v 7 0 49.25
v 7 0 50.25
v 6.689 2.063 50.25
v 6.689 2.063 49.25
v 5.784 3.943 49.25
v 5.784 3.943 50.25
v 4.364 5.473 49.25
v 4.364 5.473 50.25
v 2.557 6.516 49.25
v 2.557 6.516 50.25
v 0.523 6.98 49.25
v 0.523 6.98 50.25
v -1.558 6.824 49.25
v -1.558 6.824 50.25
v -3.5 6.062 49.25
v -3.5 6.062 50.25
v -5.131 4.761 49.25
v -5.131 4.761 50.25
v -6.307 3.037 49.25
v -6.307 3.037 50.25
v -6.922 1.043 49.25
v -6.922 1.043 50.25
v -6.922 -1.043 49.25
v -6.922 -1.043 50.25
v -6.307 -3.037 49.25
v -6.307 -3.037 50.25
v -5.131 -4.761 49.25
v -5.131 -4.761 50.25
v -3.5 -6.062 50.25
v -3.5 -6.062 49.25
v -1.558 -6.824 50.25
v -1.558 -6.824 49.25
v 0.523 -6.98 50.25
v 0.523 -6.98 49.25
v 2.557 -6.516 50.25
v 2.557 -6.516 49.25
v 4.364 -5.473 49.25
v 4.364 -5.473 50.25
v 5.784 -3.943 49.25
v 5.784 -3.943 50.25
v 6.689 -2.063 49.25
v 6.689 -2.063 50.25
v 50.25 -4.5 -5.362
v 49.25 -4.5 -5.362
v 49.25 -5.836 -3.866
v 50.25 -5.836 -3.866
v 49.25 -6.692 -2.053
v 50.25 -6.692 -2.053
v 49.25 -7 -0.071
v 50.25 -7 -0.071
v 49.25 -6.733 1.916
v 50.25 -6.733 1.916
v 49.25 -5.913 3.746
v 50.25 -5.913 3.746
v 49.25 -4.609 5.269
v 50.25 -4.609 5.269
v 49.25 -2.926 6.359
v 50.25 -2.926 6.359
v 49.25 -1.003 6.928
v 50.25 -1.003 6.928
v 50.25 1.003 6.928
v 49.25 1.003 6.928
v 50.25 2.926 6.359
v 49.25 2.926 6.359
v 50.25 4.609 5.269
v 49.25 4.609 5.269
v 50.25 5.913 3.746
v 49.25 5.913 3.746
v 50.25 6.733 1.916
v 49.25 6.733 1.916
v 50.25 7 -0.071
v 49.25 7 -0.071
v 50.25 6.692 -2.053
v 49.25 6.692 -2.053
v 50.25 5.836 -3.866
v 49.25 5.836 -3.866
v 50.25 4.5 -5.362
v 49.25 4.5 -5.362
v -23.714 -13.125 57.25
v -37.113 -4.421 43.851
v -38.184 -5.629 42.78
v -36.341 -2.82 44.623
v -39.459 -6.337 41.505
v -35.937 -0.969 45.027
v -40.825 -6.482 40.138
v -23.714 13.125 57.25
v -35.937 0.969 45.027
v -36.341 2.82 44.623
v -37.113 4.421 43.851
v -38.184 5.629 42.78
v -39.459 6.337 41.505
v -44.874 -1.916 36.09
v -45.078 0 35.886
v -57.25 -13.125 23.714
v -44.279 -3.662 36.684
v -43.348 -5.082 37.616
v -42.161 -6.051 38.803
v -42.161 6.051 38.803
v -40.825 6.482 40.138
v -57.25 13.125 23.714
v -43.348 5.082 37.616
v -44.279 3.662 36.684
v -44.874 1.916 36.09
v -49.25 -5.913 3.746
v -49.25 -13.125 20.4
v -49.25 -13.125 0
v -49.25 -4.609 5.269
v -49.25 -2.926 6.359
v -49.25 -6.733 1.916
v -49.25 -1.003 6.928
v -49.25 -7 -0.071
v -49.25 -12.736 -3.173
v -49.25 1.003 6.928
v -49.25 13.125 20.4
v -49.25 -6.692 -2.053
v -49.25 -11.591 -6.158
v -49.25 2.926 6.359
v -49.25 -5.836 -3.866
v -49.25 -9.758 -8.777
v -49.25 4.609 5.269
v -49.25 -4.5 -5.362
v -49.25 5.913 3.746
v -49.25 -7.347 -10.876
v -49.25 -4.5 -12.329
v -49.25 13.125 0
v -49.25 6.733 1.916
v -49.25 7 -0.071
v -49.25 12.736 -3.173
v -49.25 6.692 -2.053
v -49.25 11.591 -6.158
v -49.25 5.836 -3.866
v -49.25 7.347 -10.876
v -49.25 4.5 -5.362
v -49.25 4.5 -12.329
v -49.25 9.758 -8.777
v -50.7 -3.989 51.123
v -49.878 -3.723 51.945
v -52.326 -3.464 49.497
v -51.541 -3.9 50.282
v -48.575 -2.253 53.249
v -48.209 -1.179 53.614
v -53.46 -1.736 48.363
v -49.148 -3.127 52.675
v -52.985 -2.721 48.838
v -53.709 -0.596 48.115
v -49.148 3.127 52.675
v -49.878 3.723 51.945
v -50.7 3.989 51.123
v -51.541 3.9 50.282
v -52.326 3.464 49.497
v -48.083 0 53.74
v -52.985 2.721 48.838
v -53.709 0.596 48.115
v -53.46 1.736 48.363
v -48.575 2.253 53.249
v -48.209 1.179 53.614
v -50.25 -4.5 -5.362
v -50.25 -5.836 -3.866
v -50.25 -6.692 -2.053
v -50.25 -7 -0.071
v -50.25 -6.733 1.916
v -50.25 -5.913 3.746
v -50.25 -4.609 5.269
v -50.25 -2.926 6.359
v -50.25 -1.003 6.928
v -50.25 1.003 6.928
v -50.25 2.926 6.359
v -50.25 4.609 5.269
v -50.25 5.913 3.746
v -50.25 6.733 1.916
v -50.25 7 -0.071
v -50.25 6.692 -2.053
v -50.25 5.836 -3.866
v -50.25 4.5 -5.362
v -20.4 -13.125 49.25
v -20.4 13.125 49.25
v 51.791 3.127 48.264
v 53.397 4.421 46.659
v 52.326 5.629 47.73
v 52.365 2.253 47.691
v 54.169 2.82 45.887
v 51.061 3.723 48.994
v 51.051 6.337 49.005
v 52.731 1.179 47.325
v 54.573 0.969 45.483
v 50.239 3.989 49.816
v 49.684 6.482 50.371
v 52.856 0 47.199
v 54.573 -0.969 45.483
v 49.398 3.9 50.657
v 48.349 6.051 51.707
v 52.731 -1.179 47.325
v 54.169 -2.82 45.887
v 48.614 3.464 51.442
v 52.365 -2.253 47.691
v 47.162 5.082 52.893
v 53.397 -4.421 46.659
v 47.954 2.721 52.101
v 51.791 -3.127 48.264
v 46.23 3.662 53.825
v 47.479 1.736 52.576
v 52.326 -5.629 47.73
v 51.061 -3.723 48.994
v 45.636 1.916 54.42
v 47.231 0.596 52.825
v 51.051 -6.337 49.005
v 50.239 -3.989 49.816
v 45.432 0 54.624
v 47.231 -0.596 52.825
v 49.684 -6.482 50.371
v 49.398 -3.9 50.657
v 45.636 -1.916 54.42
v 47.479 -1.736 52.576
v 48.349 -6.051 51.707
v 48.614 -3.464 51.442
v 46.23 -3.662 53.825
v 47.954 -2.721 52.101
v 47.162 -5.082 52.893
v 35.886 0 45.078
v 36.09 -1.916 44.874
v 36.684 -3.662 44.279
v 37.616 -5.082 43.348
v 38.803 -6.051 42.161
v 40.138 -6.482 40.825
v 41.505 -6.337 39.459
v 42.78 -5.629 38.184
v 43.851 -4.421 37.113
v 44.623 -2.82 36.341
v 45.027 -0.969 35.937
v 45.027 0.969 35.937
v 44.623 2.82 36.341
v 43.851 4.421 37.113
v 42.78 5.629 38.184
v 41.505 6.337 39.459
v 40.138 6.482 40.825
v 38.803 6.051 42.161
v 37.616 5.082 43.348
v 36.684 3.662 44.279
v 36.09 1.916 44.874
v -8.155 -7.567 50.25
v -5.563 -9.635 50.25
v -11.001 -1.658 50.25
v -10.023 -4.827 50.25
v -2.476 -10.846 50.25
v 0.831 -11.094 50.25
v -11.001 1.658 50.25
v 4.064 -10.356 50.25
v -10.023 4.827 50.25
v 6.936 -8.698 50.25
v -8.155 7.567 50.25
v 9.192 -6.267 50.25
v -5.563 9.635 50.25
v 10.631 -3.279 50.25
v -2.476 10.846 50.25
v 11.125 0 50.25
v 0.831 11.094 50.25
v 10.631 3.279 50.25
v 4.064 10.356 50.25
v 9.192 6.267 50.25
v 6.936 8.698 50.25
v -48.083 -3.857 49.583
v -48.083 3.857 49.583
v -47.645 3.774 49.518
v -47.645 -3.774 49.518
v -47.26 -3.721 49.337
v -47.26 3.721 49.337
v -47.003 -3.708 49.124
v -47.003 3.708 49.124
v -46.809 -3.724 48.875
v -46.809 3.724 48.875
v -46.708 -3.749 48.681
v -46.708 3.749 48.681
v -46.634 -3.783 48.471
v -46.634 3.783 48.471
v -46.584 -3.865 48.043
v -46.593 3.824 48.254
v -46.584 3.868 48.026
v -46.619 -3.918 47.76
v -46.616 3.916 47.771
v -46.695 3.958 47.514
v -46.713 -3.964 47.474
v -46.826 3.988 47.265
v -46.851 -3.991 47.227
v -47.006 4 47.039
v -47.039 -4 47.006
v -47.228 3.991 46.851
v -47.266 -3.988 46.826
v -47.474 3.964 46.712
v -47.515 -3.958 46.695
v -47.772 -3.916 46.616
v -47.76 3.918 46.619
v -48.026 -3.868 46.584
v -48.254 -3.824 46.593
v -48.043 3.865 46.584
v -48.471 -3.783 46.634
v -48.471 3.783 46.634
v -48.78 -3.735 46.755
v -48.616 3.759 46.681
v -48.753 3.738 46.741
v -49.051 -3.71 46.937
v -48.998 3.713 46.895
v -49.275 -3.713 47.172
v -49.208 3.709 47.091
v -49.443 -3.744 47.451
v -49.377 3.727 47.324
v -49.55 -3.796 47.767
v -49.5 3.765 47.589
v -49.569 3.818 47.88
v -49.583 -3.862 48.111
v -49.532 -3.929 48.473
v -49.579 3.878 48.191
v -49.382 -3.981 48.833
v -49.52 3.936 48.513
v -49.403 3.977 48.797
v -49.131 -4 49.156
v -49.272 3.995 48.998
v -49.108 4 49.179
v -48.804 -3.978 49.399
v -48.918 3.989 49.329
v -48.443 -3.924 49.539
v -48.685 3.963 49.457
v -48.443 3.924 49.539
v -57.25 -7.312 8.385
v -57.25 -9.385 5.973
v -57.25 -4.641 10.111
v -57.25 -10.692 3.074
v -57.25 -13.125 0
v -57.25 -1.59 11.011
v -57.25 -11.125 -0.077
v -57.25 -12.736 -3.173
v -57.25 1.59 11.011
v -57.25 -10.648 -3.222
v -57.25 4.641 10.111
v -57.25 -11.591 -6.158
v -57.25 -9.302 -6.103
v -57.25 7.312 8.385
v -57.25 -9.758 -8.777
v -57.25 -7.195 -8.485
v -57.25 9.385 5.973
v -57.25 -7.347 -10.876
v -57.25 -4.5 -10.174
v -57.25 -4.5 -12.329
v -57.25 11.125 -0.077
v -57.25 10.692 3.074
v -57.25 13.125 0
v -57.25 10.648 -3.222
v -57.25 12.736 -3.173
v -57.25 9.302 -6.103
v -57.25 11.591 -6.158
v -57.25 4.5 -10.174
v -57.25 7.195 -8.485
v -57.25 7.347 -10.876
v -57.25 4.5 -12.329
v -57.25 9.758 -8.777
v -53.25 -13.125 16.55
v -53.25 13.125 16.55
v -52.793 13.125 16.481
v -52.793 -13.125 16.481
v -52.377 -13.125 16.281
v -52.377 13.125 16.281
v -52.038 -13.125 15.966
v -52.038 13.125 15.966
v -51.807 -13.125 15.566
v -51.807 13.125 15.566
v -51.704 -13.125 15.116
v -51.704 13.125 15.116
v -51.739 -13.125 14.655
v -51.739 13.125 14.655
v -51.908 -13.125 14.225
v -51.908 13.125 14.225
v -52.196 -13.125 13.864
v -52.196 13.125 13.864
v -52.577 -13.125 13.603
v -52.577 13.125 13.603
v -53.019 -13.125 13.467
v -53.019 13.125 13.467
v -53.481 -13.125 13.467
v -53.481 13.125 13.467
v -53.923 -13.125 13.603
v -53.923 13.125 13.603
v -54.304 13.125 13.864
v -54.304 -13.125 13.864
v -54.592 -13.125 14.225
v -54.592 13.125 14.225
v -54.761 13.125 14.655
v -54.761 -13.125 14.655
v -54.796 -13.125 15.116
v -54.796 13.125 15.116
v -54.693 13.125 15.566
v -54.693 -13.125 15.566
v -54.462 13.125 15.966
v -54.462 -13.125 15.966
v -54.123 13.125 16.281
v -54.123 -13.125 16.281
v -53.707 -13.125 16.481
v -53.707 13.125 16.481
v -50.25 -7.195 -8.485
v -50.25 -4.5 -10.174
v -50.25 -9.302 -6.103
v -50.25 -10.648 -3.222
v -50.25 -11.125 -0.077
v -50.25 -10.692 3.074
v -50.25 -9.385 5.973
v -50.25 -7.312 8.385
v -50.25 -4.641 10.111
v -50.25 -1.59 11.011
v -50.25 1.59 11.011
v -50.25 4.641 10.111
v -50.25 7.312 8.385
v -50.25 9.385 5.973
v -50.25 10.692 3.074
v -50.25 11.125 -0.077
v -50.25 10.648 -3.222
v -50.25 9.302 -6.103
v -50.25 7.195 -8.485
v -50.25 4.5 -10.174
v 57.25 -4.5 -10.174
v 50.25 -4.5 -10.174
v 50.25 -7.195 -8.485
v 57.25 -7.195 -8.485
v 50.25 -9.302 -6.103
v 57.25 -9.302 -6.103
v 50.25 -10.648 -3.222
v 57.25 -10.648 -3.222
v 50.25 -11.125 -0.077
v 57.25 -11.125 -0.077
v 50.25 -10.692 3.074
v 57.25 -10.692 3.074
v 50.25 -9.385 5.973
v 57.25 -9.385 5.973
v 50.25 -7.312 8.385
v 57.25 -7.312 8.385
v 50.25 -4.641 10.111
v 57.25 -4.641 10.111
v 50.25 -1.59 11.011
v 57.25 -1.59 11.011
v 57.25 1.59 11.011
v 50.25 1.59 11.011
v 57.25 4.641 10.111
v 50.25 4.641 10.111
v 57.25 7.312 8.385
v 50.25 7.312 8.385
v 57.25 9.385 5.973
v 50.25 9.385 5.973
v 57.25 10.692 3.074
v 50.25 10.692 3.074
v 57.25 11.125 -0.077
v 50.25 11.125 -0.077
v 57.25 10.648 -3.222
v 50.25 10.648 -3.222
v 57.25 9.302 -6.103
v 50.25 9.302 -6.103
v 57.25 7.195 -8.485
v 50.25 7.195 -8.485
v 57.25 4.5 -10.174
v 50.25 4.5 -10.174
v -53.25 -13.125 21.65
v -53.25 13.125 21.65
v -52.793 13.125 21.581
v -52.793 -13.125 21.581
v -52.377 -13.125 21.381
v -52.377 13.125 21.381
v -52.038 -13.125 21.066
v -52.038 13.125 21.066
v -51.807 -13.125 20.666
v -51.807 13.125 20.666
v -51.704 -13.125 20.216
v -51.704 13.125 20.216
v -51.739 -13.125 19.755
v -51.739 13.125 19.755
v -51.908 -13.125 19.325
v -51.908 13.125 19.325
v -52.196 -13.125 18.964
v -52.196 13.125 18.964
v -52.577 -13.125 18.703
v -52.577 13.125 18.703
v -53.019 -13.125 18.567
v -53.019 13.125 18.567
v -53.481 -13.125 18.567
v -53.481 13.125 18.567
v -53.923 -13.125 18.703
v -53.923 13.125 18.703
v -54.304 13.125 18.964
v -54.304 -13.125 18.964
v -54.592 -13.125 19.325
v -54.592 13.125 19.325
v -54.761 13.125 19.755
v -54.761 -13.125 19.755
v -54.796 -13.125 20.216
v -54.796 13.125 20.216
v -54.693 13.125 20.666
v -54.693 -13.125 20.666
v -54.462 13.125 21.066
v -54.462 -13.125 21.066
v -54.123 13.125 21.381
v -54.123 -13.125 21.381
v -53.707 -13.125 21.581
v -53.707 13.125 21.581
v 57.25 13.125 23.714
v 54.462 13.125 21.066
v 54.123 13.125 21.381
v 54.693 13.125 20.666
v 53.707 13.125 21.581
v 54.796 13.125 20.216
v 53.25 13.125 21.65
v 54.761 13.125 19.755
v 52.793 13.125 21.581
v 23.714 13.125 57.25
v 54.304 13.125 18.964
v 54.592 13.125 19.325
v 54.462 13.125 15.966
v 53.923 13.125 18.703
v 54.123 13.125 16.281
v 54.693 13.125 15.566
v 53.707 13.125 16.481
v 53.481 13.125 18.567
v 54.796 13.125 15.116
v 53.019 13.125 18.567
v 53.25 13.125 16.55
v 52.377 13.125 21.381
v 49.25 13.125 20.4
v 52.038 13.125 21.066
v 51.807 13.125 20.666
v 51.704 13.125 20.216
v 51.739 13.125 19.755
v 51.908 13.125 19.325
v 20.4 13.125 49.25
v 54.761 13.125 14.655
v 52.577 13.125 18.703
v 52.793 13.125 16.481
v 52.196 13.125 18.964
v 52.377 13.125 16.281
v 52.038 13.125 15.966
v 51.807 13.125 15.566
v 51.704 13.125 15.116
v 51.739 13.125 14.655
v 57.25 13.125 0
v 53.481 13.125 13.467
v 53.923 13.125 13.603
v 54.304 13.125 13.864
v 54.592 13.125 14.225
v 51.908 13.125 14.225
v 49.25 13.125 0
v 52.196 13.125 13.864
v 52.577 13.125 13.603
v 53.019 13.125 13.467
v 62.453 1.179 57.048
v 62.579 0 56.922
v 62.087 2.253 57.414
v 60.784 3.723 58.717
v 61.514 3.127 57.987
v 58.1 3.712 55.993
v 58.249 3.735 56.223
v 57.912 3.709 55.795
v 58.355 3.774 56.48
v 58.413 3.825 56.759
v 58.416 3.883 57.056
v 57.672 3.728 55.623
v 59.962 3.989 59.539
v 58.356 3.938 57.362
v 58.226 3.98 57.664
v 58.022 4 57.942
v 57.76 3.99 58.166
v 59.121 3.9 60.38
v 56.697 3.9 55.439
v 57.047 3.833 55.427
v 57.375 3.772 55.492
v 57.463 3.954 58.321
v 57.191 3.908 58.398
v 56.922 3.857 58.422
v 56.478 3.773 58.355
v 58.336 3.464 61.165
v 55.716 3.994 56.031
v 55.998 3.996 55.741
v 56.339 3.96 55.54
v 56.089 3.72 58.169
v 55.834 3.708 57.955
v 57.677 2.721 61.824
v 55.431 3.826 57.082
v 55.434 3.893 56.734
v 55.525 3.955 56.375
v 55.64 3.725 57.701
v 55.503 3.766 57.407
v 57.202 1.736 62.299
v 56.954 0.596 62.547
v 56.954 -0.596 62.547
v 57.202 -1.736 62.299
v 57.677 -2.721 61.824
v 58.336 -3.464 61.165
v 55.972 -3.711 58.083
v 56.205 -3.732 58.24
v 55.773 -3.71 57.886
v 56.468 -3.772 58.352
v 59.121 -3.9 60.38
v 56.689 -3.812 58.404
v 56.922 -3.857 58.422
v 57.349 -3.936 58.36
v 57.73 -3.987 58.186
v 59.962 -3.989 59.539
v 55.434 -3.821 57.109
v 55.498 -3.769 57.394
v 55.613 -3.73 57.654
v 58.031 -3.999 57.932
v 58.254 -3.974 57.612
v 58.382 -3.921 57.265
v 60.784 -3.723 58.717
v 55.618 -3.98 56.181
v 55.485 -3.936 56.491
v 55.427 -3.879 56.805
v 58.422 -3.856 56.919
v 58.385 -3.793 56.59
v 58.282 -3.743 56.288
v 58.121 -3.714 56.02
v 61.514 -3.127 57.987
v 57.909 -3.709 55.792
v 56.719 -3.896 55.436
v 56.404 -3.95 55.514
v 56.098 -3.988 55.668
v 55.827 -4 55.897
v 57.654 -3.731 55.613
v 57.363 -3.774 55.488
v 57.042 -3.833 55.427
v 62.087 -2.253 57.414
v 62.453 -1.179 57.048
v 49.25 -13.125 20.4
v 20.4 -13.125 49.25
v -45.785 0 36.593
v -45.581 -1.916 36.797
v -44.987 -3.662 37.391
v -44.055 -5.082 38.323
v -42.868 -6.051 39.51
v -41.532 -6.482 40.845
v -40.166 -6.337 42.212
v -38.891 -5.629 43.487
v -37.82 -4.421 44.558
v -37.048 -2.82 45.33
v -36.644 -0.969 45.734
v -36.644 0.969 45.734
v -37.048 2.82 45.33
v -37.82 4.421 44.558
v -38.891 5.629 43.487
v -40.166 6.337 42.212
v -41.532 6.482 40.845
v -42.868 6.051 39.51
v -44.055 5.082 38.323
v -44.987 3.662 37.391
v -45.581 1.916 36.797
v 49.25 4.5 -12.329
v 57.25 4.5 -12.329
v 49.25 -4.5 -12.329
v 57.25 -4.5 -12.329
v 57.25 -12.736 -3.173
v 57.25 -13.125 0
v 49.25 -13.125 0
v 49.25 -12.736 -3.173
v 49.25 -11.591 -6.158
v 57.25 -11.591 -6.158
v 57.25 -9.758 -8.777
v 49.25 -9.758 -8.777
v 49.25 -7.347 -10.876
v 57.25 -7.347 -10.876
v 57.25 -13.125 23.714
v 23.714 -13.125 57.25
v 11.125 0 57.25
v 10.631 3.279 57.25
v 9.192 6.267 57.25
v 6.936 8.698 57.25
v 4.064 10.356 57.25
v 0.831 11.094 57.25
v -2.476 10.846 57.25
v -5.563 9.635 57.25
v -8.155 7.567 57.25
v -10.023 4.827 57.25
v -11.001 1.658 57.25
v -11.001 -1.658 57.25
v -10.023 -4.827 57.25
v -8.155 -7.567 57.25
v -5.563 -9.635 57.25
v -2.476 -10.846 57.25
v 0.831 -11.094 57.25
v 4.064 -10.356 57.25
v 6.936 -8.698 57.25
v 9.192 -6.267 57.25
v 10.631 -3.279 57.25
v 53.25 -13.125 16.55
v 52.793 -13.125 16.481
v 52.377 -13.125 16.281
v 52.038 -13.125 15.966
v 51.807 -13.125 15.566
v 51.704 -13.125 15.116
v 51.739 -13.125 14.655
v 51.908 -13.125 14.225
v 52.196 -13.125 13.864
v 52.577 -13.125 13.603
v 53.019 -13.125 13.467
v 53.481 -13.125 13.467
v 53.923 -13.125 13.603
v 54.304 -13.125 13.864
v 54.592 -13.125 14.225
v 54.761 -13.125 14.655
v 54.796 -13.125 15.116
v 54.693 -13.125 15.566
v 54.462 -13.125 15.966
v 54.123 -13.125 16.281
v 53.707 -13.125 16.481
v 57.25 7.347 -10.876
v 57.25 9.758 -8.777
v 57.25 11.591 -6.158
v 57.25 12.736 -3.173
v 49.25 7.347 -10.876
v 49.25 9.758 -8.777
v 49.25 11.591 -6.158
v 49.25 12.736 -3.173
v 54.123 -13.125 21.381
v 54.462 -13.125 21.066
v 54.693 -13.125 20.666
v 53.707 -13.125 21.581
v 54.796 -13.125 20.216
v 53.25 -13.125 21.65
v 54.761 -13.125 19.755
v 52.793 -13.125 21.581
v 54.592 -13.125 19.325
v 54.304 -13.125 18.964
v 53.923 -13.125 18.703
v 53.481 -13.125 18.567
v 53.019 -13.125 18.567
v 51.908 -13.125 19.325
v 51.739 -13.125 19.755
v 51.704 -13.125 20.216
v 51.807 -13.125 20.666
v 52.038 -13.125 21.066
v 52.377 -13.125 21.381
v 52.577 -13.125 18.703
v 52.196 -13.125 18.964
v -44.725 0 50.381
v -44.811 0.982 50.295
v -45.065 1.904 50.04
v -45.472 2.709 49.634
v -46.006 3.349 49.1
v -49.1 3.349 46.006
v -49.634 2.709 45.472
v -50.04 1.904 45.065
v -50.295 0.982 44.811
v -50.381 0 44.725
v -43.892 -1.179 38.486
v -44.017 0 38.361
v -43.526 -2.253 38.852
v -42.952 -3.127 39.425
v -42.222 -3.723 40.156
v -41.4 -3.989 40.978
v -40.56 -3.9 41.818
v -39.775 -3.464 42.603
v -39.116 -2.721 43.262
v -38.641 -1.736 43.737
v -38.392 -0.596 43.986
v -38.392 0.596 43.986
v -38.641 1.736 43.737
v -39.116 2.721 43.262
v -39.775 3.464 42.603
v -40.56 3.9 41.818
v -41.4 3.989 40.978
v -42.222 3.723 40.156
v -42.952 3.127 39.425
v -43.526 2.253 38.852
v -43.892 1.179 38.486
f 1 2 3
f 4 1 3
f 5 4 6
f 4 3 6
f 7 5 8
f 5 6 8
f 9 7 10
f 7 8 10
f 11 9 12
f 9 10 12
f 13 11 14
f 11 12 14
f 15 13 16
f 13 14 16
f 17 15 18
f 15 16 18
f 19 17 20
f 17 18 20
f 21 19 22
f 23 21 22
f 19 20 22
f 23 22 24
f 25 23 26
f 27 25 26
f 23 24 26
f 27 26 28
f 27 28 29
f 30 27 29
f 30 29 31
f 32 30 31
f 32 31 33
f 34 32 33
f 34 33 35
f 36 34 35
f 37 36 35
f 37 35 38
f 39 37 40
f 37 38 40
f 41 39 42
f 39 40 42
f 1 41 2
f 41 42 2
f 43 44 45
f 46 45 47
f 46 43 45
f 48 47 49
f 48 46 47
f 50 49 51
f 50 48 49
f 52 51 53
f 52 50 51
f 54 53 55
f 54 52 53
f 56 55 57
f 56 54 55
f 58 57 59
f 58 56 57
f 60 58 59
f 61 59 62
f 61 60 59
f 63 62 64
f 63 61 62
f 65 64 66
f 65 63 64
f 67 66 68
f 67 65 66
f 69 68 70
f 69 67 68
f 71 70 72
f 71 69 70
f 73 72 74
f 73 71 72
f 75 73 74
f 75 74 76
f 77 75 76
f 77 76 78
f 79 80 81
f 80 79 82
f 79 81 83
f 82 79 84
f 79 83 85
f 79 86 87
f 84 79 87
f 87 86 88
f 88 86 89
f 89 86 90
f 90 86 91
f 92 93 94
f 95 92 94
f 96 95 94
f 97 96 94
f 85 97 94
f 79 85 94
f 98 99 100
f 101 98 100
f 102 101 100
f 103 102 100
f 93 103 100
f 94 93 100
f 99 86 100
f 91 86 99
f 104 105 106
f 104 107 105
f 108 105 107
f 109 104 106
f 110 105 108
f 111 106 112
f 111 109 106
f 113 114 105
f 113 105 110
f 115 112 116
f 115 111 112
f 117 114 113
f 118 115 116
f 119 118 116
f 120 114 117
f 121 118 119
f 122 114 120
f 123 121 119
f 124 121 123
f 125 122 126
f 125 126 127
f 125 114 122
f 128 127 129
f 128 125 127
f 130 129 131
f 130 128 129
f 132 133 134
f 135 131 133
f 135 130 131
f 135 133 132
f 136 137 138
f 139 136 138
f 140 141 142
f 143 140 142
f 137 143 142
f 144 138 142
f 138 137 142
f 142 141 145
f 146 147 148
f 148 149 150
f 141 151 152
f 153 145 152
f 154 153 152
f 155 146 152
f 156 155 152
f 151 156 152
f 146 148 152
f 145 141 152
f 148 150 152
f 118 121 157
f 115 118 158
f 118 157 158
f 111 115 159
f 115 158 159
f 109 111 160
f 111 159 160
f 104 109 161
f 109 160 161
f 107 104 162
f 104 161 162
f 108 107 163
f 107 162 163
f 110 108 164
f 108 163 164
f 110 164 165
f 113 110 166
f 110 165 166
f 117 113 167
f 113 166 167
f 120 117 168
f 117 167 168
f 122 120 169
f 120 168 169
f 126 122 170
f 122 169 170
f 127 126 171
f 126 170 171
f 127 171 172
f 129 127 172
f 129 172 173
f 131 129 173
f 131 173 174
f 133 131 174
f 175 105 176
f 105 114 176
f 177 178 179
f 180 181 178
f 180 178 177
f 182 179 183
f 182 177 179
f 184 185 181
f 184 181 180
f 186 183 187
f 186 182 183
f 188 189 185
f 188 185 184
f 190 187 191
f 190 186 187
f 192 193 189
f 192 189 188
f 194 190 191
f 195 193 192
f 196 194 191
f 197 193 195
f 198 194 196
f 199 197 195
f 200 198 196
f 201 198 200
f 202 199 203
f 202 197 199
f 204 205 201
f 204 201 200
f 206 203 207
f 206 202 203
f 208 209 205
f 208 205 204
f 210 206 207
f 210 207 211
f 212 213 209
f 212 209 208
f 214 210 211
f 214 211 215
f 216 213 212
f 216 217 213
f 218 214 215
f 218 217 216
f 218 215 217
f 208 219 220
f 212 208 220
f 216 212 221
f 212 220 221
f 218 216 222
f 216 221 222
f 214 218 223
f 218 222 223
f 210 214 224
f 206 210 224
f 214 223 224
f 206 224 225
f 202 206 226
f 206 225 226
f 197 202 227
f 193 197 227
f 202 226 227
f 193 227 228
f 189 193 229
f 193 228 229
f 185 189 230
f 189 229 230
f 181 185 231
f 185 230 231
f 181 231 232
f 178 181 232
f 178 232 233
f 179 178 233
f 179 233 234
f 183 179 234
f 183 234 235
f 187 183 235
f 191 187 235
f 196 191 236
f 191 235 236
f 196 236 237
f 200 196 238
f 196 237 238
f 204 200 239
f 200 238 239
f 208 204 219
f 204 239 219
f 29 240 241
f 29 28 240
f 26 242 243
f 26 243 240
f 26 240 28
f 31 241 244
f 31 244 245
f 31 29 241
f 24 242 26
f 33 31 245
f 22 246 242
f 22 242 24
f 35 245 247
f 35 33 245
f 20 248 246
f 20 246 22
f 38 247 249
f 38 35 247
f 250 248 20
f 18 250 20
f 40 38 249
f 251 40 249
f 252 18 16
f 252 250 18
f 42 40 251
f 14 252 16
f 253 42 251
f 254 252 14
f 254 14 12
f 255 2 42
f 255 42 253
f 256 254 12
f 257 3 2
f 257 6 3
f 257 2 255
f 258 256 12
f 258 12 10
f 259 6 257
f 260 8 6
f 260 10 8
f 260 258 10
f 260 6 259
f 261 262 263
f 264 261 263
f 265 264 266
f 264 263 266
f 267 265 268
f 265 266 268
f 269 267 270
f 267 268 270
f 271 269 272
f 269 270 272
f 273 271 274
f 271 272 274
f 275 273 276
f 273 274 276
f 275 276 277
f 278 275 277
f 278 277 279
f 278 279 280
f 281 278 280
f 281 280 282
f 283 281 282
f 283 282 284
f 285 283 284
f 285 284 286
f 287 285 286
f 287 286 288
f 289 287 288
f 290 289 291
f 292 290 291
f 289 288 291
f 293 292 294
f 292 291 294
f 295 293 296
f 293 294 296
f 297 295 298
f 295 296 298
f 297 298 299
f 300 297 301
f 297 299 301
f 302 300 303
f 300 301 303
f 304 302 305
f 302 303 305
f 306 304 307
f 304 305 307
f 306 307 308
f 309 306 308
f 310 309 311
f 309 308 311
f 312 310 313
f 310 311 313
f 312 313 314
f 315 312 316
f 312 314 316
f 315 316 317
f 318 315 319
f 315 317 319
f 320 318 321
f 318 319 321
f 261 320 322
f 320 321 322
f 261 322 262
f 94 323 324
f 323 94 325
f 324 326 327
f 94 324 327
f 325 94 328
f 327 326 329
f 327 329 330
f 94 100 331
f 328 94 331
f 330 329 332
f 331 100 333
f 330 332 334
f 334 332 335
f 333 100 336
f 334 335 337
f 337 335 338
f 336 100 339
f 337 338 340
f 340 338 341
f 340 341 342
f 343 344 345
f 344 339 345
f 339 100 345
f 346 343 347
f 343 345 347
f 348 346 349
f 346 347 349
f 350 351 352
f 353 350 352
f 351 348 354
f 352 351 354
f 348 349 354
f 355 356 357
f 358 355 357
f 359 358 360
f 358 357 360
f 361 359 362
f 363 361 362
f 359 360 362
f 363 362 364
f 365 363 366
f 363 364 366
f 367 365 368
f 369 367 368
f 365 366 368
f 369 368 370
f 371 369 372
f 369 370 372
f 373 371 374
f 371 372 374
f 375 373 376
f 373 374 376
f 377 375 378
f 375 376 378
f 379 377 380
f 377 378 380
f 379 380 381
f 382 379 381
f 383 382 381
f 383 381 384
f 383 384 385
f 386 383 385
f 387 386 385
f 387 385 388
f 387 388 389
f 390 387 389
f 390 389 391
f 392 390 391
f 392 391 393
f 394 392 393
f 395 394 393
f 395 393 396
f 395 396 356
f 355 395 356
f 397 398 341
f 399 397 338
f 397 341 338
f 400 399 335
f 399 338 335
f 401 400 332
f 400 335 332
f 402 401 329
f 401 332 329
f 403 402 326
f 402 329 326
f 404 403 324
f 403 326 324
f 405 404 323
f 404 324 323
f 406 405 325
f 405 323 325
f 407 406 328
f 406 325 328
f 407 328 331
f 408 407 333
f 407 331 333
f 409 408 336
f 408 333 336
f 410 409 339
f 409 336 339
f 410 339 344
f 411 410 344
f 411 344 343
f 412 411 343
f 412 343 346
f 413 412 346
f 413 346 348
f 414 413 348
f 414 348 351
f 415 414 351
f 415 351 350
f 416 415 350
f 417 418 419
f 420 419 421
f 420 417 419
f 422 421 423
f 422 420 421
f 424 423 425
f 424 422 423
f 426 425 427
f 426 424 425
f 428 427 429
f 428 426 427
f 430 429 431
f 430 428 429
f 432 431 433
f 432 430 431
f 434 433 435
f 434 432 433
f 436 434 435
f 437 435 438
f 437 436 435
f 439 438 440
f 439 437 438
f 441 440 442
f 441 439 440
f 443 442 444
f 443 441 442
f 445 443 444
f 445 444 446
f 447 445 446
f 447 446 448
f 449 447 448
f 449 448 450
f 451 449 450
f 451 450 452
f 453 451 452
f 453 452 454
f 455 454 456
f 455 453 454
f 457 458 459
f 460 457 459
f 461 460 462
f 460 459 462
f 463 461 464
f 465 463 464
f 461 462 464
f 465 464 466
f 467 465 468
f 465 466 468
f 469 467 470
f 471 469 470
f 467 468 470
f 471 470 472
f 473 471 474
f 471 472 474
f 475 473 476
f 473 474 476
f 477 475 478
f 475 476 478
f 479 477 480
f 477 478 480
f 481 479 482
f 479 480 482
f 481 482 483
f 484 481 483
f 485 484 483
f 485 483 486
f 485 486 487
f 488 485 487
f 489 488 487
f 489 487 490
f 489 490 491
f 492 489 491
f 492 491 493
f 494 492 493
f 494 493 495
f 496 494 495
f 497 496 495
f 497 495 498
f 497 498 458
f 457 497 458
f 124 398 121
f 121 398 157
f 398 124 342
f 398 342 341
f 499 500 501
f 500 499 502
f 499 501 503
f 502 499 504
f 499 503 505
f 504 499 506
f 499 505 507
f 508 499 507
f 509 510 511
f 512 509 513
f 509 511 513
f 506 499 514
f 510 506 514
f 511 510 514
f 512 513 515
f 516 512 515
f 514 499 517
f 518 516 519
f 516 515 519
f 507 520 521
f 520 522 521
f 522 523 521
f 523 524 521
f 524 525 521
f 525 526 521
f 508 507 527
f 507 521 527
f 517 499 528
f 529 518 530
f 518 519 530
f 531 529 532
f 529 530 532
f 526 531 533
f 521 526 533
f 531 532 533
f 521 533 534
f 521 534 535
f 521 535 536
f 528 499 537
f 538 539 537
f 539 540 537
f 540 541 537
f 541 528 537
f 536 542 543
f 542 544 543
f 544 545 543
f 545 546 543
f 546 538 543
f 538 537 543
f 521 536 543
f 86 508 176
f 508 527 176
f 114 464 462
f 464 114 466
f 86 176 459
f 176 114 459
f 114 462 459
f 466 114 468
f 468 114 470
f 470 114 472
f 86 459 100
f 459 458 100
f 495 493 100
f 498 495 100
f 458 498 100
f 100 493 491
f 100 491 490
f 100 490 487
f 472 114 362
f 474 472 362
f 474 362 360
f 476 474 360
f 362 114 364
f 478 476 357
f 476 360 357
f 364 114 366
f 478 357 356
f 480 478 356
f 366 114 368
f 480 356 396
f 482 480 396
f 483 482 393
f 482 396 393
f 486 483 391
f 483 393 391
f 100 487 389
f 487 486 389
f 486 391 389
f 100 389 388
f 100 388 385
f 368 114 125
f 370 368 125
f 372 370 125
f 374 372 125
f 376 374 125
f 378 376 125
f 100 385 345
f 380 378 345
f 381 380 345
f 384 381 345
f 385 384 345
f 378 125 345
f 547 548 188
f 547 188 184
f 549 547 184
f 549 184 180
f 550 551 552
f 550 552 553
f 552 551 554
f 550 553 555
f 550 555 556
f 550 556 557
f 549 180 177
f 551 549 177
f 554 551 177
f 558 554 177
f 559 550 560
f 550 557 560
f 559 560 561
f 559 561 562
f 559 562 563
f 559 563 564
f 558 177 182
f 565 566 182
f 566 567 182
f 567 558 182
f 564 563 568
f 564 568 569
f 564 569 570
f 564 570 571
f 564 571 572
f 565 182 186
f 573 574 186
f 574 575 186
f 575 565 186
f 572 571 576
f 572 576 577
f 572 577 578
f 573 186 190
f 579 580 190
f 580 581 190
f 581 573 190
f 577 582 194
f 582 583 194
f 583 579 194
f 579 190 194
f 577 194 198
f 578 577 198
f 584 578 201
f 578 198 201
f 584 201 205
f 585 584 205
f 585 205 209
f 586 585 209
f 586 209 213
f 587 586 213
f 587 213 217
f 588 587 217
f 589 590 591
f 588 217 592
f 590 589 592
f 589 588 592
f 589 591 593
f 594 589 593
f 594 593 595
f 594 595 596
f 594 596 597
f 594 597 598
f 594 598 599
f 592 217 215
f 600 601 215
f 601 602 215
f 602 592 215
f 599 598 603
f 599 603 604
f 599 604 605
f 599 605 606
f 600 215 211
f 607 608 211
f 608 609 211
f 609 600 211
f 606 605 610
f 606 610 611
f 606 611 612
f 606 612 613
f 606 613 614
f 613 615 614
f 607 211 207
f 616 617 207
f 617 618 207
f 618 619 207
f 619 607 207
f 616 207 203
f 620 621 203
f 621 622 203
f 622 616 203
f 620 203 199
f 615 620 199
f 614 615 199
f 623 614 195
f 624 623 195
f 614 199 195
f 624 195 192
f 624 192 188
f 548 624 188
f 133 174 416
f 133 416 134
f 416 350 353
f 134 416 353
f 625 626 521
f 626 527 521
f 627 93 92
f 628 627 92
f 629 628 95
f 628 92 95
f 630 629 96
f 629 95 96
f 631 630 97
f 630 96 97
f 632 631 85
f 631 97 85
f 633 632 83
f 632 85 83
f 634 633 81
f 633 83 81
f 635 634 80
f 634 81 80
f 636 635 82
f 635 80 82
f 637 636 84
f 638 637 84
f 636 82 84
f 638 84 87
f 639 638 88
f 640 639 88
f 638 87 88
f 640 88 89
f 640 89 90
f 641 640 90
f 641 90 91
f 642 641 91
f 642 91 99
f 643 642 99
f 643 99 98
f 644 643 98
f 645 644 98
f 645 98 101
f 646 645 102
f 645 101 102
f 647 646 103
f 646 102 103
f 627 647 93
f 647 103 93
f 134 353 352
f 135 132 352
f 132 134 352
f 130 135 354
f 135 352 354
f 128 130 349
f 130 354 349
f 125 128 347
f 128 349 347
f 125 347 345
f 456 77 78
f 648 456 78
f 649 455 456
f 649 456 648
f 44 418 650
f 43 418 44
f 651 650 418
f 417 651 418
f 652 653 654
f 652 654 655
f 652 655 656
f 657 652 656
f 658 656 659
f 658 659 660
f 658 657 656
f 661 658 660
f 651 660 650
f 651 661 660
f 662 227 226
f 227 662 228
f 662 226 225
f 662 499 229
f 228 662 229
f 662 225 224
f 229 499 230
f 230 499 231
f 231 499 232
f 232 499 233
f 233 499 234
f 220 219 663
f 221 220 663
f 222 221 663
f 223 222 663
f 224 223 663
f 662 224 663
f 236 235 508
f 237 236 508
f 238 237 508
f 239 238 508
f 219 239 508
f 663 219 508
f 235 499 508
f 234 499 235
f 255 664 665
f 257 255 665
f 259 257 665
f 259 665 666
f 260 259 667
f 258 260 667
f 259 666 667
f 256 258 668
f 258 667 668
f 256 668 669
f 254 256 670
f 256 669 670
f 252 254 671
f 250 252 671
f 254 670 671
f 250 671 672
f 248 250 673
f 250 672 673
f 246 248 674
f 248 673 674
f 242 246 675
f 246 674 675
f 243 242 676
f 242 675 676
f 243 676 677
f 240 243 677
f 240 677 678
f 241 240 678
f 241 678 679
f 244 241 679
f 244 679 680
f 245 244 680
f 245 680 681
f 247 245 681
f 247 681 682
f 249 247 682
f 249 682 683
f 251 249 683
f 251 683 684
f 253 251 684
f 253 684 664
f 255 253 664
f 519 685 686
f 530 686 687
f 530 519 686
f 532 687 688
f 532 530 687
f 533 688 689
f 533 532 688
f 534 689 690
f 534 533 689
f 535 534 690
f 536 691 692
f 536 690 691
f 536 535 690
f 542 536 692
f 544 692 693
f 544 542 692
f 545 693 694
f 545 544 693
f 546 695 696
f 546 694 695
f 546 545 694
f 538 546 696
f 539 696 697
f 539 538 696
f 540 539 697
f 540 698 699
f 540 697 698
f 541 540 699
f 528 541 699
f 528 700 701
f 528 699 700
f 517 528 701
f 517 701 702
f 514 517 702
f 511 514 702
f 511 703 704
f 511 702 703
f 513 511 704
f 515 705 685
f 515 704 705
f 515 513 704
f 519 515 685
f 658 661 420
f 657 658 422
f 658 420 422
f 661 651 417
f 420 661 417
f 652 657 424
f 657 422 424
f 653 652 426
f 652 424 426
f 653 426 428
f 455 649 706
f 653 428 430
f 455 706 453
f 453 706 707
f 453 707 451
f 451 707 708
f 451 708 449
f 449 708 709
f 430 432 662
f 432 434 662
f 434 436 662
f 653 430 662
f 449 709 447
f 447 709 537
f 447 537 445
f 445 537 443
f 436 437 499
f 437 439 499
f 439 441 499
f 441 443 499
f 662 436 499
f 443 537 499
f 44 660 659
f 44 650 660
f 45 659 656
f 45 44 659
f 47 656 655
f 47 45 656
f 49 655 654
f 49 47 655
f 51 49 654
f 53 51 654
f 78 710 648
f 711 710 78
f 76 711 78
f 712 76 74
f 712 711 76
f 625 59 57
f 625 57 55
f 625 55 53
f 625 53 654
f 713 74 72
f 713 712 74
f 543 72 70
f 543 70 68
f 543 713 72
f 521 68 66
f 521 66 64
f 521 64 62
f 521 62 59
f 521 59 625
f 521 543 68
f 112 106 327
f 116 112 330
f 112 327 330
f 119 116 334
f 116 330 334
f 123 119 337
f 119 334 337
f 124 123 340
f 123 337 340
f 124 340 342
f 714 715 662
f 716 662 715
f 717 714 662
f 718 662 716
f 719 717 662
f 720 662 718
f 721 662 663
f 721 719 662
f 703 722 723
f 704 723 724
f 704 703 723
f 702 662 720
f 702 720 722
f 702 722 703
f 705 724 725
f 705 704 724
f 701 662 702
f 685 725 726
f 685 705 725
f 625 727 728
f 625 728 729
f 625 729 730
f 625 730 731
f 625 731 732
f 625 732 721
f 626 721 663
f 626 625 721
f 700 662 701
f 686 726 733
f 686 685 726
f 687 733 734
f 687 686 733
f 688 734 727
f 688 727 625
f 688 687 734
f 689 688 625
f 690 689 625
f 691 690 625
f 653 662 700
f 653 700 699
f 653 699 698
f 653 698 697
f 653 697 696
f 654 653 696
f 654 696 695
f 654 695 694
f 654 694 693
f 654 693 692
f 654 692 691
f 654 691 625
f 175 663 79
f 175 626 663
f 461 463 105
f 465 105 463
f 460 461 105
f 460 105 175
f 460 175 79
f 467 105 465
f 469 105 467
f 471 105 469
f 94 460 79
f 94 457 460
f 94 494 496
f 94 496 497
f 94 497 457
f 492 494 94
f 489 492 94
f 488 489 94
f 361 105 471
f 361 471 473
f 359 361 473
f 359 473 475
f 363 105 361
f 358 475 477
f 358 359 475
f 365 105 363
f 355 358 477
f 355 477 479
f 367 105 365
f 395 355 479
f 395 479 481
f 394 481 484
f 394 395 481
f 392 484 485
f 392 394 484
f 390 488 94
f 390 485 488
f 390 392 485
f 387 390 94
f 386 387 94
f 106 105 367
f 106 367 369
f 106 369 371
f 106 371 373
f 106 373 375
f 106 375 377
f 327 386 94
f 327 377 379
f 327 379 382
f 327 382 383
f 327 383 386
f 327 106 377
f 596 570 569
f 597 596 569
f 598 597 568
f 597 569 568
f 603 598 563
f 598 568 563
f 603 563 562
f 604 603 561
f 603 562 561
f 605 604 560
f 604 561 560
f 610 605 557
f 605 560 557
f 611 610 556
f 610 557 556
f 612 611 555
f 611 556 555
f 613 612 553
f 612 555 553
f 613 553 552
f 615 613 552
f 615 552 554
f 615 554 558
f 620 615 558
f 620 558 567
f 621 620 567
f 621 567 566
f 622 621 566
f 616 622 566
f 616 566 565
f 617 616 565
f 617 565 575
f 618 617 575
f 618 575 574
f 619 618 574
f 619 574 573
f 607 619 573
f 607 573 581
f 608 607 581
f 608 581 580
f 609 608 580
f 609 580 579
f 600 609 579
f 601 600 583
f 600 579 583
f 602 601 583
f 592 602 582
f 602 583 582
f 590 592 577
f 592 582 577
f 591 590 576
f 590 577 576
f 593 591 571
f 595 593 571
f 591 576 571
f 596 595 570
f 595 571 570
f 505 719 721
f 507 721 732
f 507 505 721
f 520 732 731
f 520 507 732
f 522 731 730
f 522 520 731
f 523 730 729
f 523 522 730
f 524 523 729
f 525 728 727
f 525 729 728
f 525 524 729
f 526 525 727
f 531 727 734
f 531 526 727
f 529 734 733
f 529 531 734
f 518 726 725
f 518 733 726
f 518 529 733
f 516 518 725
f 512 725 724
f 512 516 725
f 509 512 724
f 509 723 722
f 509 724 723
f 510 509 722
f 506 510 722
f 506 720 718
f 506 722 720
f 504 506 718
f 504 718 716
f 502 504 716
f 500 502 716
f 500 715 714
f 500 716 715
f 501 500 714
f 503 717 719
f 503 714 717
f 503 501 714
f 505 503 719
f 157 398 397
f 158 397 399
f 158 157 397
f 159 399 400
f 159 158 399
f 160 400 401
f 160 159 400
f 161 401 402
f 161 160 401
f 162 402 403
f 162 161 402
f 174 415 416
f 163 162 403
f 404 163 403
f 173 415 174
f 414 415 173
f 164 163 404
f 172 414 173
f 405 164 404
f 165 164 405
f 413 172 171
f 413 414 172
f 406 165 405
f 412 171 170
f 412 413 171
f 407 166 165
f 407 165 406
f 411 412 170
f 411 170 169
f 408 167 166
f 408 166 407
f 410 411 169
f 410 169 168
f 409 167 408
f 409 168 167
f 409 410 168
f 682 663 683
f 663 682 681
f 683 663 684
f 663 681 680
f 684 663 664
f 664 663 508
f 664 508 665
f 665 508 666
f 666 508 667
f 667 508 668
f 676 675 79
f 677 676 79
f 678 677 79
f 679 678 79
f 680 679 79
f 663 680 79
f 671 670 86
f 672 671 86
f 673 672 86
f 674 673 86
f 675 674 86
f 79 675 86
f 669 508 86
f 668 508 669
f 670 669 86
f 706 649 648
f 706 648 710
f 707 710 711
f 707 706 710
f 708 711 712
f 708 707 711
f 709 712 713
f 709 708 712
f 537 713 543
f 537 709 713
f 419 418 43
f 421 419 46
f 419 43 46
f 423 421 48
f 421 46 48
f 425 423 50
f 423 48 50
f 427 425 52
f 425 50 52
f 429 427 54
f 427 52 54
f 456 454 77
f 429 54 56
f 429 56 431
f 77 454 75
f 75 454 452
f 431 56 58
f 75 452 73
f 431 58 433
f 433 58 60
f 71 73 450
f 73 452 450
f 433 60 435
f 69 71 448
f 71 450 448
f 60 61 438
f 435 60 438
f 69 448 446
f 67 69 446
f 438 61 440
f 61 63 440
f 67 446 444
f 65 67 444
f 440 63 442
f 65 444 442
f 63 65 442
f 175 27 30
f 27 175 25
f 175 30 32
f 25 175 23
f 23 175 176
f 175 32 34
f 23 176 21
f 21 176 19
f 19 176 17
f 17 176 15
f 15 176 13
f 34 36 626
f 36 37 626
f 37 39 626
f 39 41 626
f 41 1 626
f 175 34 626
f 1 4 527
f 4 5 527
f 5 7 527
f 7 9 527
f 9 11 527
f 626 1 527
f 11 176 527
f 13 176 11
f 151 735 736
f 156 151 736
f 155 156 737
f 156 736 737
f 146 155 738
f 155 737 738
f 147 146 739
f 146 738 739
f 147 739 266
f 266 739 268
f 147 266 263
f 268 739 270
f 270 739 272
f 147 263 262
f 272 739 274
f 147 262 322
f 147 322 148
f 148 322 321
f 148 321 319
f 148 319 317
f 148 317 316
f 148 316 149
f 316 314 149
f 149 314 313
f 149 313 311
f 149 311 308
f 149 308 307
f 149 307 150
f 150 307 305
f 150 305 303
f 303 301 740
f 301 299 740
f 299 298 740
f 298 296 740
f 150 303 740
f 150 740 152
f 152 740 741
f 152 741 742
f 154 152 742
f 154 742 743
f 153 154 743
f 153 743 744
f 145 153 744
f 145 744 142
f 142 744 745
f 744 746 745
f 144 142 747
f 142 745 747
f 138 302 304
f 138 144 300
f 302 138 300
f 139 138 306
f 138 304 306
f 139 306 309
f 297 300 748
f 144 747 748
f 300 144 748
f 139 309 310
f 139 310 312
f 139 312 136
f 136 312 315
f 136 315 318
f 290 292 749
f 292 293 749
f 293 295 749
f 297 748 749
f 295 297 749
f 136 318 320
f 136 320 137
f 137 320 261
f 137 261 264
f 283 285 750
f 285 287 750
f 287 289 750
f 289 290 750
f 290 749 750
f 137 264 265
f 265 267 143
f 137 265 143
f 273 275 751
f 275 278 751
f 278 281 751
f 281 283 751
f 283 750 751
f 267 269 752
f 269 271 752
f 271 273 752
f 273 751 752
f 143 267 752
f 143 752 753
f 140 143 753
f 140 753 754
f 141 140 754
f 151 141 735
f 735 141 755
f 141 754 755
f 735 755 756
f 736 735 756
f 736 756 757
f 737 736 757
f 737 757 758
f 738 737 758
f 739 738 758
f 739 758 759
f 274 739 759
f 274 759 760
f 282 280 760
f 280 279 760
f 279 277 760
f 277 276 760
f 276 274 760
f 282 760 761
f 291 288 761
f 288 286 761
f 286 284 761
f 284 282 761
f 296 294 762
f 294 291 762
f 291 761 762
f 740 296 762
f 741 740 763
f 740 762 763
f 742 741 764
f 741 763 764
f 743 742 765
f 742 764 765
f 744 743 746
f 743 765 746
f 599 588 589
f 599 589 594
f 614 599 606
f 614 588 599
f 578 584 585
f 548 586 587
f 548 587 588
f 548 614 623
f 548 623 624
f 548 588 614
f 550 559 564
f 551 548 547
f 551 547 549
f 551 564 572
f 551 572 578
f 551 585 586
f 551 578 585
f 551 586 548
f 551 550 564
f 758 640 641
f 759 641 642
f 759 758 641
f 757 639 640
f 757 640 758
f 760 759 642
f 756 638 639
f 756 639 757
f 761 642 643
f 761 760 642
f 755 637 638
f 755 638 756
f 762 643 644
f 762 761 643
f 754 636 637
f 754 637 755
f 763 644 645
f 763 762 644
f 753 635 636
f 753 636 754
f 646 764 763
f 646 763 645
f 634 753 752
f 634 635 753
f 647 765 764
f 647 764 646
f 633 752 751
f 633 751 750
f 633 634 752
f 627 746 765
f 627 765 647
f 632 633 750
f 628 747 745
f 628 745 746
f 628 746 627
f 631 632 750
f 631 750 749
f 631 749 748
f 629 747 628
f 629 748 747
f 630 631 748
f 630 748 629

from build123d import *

# Parameters (mm, degrees)
BOSS_EXTRUDE1_DEPTH = 13.125
SKETCH2_R           = 7
CUT_EXTRUDE1_DEPTH  = 106.5
SKETCH2_4_R         = 11.125
SKETCH2_4_R_2       = 7
CUT_EXTRUDE2_DEPTH  = 7
SKETCH4_R           = 4
BOSS_EXTRUDE3_DEPTH = 10
SKETCH5_R           = 6.5
BOSS_EXTRUDE4_DEPTH = 1
CIRPATTERN1_COUNT   = 2
CIRPATTERN1_ANGLE   = 45
SKETCH9_R           = 4
BOSS_EXTRUDE6_DEPTH = 20
CUT_EXTRUDE6_REACH  = 96.758
SKETCH10_R          = 1.5
SKETCH11_R          = 6.5
BOSS_EXTRUDE7_DEPTH = 13.5
SKETCH12_R          = 4
BOSS_EXTRUDE8_DEPTH = 13.75
SKETCH13_R          = 1.5
CUT_EXTRUDE7_DEPTH  = 13.75
SKETCH14_R          = 11.125
CUT_EXTRUDE8_DEPTH  = 17
SKETCH15_R          = 7
CUT_EXTRUDE9_DEPTH  = 1
SKETCH16_R          = 1.55
CUT_EXTRUDE10_DEPTH = 93.310955607


with BuildPart() as part:
    # Sketch1 → Boss-Extrude1 (new, symmetric)
    with BuildSketch(Plane(origin=(0, 0, 0), x_dir=(1, 0, 0), z_dir=(0, 1, 0))):
        Polygon((-49.25, 13.125), (-49.25, -13.125), (-49.25, -20.400017947), (-20.400017947, -49.25), (20.400017947, -49.25), (49.25, -20.400017947), (49.25, -13.125), (49.25, 13.125), (57.25, 13.125), (57.25, -23.713726446), (23.713726446, -57.25), (-23.713726446, -57.25), (-57.25, -23.713726446), (-57.25, 13.125), align=None)
    extrude(amount=BOSS_EXTRUDE1_DEPTH, both=True)

    # Sketch2 → Cut-Extrude1 (cut)
    with BuildSketch(Plane.ZY.offset(57.25)):
        with BuildLine():
            Line((-13.125, 13.125), (-13.125, 0))
            ThreePointArc((-13.125, 0), (-12.924585281, 2.284889562), (-12.329461667, 4.5))
            ThreePointArc((-12.329461667, 4.5), (-7.523400993, 10.7547228), (0, 13.125))
            Line((0, 13.125), (-13.125, 13.125))
        make_face()
        with BuildLine():
            ThreePointArc((-12.329461667, -4.5), (-12.924585281, -2.284889562), (-13.125, 0))
            Line((-13.125, 0), (-13.125, -13.125))
            Line((-13.125, -13.125), (0, -13.125))
            ThreePointArc((0, -13.125), (-7.523400993, -10.7547228), (-12.329461667, -4.5))
        make_face()
        Circle(SKETCH2_R)
        with BuildLine():
            ThreePointArc((-5.361902647, -4.5), (-6.577739678, -2.394439545), (-7, 0))
            Line((-7, 0), (-11.125, 0))
            ThreePointArc((-11.125, 0), (-10.88472093, -2.299668513), (-10.174262873, -4.5))
            Line((-10.174262873, -4.5), (-5.361902647, -4.5))
        make_face()
        with BuildLine():
            Line((-11.125, 0), (-7, 0))
            ThreePointArc((-7, 0), (-6.577739678, 2.394439545), (-5.361902647, 4.5))
            Line((-5.361902647, 4.5), (-10.174262873, 4.5))
            ThreePointArc((-10.174262873, 4.5), (-10.88472093, 2.299668513), (-11.125, 0))
        make_face()
        with BuildLine():
            ThreePointArc((-10.174262873, -4.5), (-10.88472093, -2.299668513), (-11.125, 0))
            Line((-11.125, 0), (-13.125, 0))
            ThreePointArc((-13.125, 0), (-12.924585281, -2.284889562), (-12.329461667, -4.5))
            Line((-12.329461667, -4.5), (-10.174262873, -4.5))
        make_face()
        with BuildLine():
            Line((-13.125, 0), (-11.125, 0))
            ThreePointArc((-11.125, 0), (-10.88472093, 2.299668513), (-10.174262873, 4.5))
            Line((-10.174262873, 4.5), (-12.329461667, 4.5))
            ThreePointArc((-12.329461667, 4.5), (-12.924585281, 2.284889562), (-13.125, 0))
        make_face()
    cut_extrude1 = extrude(amount=-CUT_EXTRUDE1_DEPTH, mode=Mode.SUBTRACT)

    # Sketch2_4 → Cut-Extrude2 (cut)
    with BuildSketch(Plane.ZY.offset(57.25)):
        Circle(SKETCH2_4_R)
        Circle(SKETCH2_4_R_2, mode=Mode.SUBTRACT)
    cut_extrude2 = extrude(amount=-CUT_EXTRUDE2_DEPTH, mode=Mode.SUBTRACT)

    # Mirror1: Cut-Extrude1, Cut-Extrude2 across plane
    add(cut_extrude1.mirror(Plane(origin=(0, 0, 0), x_dir=(0, 0, 1), z_dir=(1, 0, 0))), mode=Mode.SUBTRACT)
    add(cut_extrude2.mirror(Plane(origin=(0, 0, 0), x_dir=(0, 0, 1), z_dir=(1, 0, 0))), mode=Mode.SUBTRACT)

    # Sketch4 → Boss-Extrude3 (add)
    with BuildSketch(Plane(origin=(-40.481863223, 0, 40.481863223), x_dir=(0.7071067811865489, 0, 0.7071067811865461), z_dir=(-0.7071067811865461, 0, 0.7071067811865489))):
        with Locations(Location((0, 0, 0), (0, 0, 180))):
            Circle(SKETCH4_R)
    boss_extrude3 = extrude(amount=BOSS_EXTRUDE3_DEPTH)

    # Sketch5 → Boss-Extrude4 (add)
    with BuildSketch(Plane(origin=(-40.481863223, 0, 40.481863223), x_dir=(0.7071067811865489, 0, 0.7071067811865461), z_dir=(-0.7071067811865461, 0, 0.7071067811865489))):
        with Locations(Location((0, 0, 0), (0, 0, 180))):
            Circle(SKETCH5_R)
    boss_extrude4 = extrude(amount=BOSS_EXTRUDE4_DEPTH)

    # CirPattern1: Boss-Extrude3, Boss-Extrude4 ×2 about axis
    cirpattern1_axis = Axis((0, 14.4375, 0), (0, 1, 0))
    add([boss_extrude3.rotate(cirpattern1_axis, i * CIRPATTERN1_ANGLE / (CIRPATTERN1_COUNT - 1)) for i in range(1, CIRPATTERN1_COUNT)])
    add([boss_extrude4.rotate(cirpattern1_axis, i * CIRPATTERN1_ANGLE / (CIRPATTERN1_COUNT - 1)) for i in range(1, CIRPATTERN1_COUNT)])

    # Sketch9 → Boss-Extrude6 (add)
    with BuildSketch(Plane(origin=(-47.552931035, 0, 47.552931035), x_dir=(0.7071067811865489, 0, 0.7071067811865461), z_dir=(-0.7071067811865461, 0, 0.7071067811865489))):
        Circle(SKETCH9_R)
    extrude(amount=BOSS_EXTRUDE6_DEPTH)

    # Sketch10 → Cut-Extrude6 (cut, up to next)
    with BuildSketch(Plane(origin=(0, 4, 0), x_dir=(1, 0, 0), z_dir=(0, 1, 0)), mode=Mode.PRIVATE) as cut_extrude6_sk1:
        Polygon((-48.083261121, -53.74011537), (-53.74011537, -48.083261121), (-64.523493783, -58.866639534), (-58.866639534, -64.523493783), align=None)
    cut_extrude6_tool1 = extrude(cut_extrude6_sk1.sketch, amount=-CUT_EXTRUDE6_REACH, mode=Mode.PRIVATE) & part.part
    # Sketch10 → Cut-Extrude6 (cut, up to next)
    with BuildSketch(Plane(origin=(0, 4, 0), x_dir=(1, 0, 0), z_dir=(0, 1, 0)), mode=Mode.PRIVATE) as cut_extrude6_sk2:
        with Locations(Location((-48.083261121, -48.083261121, 0), (0, 0, 270))):
            Circle(SKETCH10_R)
    cut_extrude6_tool2 = extrude(cut_extrude6_sk2.sketch, amount=-CUT_EXTRUDE6_REACH, mode=Mode.PRIVATE) & part.part
    add(cut_extrude6_tool1.solids().sort_by_distance((-56.303377, 4, 56.303377))[0], mode=Mode.SUBTRACT)
    add(cut_extrude6_tool2.solids().sort_by_distance((-48.083261, 4, 48.083261))[0], mode=Mode.SUBTRACT)

    # Sketch11 → Boss-Extrude7 (add)
    with BuildSketch(Plane(origin=(40.481863223, 0, 40.481863223), x_dir=(0.7071067811865442, 0, -0.7071067811865508), z_dir=(0.7071067811865508, 0, 0.7071067811865442))):
        with Locations(Location((0, 0, 0), (0, 0, 180))):
            Circle(SKETCH11_R)
    extrude(amount=BOSS_EXTRUDE7_DEPTH)

    # Sketch12 → Boss-Extrude8 (add)
    with BuildSketch(Plane(origin=(50.027804769, 0, 50.027804769), x_dir=(0.7071067811865442, 0, -0.7071067811865508), z_dir=(0.7071067811865508, 0, 0.7071067811865442))):
        Circle(SKETCH12_R)
    extrude(amount=BOSS_EXTRUDE8_DEPTH)

    # Sketch13 → Cut-Extrude7 (cut)
    with BuildSketch(Plane(origin=(0, 4, 0), x_dir=(1, 0, 0), z_dir=(0, 1, 0))):
        with Locations(Location((56.922095886, -56.922095886, 0), (0, 0, 270))):
            Circle(SKETCH13_R)
    extrude(amount=-CUT_EXTRUDE7_DEPTH, mode=Mode.SUBTRACT)

    # Sketch14 → Cut-Extrude8 (cut)
    with BuildSketch(Plane.XY.offset(67.25)):
        Circle(SKETCH14_R)
    extrude(amount=-CUT_EXTRUDE8_DEPTH, mode=Mode.SUBTRACT)

    # Sketch15 → Cut-Extrude9 (cut)
    with BuildSketch(Plane.XY.offset(50.25)):
        Circle(SKETCH15_R)
    extrude(amount=-CUT_EXTRUDE9_DEPTH, mode=Mode.SUBTRACT)

    # Sketch16 → Cut-Extrude10 (cut, through all)
    with BuildSketch(Plane(origin=(0, 13.125, 0), x_dir=(1, 0, 0), z_dir=(0, 1, 0))):
        with Locations(Location((-53.25, -15, 0), (0, 0, 270))):
            Circle(SKETCH16_R)
        with Locations(Location((-53.25, -20.1, 0), (0, 0, 270))):
            Circle(SKETCH16_R)
    cut_extrude10 = extrude(amount=-CUT_EXTRUDE10_DEPTH, mode=Mode.SUBTRACT)

    # Mirror3: Cut-Extrude10 across plane
    add(cut_extrude10.mirror(Plane(origin=(0, 0, 0), x_dir=(0, 0, 1), z_dir=(1, 0, 0))), mode=Mode.SUBTRACT)


solid = part.part
